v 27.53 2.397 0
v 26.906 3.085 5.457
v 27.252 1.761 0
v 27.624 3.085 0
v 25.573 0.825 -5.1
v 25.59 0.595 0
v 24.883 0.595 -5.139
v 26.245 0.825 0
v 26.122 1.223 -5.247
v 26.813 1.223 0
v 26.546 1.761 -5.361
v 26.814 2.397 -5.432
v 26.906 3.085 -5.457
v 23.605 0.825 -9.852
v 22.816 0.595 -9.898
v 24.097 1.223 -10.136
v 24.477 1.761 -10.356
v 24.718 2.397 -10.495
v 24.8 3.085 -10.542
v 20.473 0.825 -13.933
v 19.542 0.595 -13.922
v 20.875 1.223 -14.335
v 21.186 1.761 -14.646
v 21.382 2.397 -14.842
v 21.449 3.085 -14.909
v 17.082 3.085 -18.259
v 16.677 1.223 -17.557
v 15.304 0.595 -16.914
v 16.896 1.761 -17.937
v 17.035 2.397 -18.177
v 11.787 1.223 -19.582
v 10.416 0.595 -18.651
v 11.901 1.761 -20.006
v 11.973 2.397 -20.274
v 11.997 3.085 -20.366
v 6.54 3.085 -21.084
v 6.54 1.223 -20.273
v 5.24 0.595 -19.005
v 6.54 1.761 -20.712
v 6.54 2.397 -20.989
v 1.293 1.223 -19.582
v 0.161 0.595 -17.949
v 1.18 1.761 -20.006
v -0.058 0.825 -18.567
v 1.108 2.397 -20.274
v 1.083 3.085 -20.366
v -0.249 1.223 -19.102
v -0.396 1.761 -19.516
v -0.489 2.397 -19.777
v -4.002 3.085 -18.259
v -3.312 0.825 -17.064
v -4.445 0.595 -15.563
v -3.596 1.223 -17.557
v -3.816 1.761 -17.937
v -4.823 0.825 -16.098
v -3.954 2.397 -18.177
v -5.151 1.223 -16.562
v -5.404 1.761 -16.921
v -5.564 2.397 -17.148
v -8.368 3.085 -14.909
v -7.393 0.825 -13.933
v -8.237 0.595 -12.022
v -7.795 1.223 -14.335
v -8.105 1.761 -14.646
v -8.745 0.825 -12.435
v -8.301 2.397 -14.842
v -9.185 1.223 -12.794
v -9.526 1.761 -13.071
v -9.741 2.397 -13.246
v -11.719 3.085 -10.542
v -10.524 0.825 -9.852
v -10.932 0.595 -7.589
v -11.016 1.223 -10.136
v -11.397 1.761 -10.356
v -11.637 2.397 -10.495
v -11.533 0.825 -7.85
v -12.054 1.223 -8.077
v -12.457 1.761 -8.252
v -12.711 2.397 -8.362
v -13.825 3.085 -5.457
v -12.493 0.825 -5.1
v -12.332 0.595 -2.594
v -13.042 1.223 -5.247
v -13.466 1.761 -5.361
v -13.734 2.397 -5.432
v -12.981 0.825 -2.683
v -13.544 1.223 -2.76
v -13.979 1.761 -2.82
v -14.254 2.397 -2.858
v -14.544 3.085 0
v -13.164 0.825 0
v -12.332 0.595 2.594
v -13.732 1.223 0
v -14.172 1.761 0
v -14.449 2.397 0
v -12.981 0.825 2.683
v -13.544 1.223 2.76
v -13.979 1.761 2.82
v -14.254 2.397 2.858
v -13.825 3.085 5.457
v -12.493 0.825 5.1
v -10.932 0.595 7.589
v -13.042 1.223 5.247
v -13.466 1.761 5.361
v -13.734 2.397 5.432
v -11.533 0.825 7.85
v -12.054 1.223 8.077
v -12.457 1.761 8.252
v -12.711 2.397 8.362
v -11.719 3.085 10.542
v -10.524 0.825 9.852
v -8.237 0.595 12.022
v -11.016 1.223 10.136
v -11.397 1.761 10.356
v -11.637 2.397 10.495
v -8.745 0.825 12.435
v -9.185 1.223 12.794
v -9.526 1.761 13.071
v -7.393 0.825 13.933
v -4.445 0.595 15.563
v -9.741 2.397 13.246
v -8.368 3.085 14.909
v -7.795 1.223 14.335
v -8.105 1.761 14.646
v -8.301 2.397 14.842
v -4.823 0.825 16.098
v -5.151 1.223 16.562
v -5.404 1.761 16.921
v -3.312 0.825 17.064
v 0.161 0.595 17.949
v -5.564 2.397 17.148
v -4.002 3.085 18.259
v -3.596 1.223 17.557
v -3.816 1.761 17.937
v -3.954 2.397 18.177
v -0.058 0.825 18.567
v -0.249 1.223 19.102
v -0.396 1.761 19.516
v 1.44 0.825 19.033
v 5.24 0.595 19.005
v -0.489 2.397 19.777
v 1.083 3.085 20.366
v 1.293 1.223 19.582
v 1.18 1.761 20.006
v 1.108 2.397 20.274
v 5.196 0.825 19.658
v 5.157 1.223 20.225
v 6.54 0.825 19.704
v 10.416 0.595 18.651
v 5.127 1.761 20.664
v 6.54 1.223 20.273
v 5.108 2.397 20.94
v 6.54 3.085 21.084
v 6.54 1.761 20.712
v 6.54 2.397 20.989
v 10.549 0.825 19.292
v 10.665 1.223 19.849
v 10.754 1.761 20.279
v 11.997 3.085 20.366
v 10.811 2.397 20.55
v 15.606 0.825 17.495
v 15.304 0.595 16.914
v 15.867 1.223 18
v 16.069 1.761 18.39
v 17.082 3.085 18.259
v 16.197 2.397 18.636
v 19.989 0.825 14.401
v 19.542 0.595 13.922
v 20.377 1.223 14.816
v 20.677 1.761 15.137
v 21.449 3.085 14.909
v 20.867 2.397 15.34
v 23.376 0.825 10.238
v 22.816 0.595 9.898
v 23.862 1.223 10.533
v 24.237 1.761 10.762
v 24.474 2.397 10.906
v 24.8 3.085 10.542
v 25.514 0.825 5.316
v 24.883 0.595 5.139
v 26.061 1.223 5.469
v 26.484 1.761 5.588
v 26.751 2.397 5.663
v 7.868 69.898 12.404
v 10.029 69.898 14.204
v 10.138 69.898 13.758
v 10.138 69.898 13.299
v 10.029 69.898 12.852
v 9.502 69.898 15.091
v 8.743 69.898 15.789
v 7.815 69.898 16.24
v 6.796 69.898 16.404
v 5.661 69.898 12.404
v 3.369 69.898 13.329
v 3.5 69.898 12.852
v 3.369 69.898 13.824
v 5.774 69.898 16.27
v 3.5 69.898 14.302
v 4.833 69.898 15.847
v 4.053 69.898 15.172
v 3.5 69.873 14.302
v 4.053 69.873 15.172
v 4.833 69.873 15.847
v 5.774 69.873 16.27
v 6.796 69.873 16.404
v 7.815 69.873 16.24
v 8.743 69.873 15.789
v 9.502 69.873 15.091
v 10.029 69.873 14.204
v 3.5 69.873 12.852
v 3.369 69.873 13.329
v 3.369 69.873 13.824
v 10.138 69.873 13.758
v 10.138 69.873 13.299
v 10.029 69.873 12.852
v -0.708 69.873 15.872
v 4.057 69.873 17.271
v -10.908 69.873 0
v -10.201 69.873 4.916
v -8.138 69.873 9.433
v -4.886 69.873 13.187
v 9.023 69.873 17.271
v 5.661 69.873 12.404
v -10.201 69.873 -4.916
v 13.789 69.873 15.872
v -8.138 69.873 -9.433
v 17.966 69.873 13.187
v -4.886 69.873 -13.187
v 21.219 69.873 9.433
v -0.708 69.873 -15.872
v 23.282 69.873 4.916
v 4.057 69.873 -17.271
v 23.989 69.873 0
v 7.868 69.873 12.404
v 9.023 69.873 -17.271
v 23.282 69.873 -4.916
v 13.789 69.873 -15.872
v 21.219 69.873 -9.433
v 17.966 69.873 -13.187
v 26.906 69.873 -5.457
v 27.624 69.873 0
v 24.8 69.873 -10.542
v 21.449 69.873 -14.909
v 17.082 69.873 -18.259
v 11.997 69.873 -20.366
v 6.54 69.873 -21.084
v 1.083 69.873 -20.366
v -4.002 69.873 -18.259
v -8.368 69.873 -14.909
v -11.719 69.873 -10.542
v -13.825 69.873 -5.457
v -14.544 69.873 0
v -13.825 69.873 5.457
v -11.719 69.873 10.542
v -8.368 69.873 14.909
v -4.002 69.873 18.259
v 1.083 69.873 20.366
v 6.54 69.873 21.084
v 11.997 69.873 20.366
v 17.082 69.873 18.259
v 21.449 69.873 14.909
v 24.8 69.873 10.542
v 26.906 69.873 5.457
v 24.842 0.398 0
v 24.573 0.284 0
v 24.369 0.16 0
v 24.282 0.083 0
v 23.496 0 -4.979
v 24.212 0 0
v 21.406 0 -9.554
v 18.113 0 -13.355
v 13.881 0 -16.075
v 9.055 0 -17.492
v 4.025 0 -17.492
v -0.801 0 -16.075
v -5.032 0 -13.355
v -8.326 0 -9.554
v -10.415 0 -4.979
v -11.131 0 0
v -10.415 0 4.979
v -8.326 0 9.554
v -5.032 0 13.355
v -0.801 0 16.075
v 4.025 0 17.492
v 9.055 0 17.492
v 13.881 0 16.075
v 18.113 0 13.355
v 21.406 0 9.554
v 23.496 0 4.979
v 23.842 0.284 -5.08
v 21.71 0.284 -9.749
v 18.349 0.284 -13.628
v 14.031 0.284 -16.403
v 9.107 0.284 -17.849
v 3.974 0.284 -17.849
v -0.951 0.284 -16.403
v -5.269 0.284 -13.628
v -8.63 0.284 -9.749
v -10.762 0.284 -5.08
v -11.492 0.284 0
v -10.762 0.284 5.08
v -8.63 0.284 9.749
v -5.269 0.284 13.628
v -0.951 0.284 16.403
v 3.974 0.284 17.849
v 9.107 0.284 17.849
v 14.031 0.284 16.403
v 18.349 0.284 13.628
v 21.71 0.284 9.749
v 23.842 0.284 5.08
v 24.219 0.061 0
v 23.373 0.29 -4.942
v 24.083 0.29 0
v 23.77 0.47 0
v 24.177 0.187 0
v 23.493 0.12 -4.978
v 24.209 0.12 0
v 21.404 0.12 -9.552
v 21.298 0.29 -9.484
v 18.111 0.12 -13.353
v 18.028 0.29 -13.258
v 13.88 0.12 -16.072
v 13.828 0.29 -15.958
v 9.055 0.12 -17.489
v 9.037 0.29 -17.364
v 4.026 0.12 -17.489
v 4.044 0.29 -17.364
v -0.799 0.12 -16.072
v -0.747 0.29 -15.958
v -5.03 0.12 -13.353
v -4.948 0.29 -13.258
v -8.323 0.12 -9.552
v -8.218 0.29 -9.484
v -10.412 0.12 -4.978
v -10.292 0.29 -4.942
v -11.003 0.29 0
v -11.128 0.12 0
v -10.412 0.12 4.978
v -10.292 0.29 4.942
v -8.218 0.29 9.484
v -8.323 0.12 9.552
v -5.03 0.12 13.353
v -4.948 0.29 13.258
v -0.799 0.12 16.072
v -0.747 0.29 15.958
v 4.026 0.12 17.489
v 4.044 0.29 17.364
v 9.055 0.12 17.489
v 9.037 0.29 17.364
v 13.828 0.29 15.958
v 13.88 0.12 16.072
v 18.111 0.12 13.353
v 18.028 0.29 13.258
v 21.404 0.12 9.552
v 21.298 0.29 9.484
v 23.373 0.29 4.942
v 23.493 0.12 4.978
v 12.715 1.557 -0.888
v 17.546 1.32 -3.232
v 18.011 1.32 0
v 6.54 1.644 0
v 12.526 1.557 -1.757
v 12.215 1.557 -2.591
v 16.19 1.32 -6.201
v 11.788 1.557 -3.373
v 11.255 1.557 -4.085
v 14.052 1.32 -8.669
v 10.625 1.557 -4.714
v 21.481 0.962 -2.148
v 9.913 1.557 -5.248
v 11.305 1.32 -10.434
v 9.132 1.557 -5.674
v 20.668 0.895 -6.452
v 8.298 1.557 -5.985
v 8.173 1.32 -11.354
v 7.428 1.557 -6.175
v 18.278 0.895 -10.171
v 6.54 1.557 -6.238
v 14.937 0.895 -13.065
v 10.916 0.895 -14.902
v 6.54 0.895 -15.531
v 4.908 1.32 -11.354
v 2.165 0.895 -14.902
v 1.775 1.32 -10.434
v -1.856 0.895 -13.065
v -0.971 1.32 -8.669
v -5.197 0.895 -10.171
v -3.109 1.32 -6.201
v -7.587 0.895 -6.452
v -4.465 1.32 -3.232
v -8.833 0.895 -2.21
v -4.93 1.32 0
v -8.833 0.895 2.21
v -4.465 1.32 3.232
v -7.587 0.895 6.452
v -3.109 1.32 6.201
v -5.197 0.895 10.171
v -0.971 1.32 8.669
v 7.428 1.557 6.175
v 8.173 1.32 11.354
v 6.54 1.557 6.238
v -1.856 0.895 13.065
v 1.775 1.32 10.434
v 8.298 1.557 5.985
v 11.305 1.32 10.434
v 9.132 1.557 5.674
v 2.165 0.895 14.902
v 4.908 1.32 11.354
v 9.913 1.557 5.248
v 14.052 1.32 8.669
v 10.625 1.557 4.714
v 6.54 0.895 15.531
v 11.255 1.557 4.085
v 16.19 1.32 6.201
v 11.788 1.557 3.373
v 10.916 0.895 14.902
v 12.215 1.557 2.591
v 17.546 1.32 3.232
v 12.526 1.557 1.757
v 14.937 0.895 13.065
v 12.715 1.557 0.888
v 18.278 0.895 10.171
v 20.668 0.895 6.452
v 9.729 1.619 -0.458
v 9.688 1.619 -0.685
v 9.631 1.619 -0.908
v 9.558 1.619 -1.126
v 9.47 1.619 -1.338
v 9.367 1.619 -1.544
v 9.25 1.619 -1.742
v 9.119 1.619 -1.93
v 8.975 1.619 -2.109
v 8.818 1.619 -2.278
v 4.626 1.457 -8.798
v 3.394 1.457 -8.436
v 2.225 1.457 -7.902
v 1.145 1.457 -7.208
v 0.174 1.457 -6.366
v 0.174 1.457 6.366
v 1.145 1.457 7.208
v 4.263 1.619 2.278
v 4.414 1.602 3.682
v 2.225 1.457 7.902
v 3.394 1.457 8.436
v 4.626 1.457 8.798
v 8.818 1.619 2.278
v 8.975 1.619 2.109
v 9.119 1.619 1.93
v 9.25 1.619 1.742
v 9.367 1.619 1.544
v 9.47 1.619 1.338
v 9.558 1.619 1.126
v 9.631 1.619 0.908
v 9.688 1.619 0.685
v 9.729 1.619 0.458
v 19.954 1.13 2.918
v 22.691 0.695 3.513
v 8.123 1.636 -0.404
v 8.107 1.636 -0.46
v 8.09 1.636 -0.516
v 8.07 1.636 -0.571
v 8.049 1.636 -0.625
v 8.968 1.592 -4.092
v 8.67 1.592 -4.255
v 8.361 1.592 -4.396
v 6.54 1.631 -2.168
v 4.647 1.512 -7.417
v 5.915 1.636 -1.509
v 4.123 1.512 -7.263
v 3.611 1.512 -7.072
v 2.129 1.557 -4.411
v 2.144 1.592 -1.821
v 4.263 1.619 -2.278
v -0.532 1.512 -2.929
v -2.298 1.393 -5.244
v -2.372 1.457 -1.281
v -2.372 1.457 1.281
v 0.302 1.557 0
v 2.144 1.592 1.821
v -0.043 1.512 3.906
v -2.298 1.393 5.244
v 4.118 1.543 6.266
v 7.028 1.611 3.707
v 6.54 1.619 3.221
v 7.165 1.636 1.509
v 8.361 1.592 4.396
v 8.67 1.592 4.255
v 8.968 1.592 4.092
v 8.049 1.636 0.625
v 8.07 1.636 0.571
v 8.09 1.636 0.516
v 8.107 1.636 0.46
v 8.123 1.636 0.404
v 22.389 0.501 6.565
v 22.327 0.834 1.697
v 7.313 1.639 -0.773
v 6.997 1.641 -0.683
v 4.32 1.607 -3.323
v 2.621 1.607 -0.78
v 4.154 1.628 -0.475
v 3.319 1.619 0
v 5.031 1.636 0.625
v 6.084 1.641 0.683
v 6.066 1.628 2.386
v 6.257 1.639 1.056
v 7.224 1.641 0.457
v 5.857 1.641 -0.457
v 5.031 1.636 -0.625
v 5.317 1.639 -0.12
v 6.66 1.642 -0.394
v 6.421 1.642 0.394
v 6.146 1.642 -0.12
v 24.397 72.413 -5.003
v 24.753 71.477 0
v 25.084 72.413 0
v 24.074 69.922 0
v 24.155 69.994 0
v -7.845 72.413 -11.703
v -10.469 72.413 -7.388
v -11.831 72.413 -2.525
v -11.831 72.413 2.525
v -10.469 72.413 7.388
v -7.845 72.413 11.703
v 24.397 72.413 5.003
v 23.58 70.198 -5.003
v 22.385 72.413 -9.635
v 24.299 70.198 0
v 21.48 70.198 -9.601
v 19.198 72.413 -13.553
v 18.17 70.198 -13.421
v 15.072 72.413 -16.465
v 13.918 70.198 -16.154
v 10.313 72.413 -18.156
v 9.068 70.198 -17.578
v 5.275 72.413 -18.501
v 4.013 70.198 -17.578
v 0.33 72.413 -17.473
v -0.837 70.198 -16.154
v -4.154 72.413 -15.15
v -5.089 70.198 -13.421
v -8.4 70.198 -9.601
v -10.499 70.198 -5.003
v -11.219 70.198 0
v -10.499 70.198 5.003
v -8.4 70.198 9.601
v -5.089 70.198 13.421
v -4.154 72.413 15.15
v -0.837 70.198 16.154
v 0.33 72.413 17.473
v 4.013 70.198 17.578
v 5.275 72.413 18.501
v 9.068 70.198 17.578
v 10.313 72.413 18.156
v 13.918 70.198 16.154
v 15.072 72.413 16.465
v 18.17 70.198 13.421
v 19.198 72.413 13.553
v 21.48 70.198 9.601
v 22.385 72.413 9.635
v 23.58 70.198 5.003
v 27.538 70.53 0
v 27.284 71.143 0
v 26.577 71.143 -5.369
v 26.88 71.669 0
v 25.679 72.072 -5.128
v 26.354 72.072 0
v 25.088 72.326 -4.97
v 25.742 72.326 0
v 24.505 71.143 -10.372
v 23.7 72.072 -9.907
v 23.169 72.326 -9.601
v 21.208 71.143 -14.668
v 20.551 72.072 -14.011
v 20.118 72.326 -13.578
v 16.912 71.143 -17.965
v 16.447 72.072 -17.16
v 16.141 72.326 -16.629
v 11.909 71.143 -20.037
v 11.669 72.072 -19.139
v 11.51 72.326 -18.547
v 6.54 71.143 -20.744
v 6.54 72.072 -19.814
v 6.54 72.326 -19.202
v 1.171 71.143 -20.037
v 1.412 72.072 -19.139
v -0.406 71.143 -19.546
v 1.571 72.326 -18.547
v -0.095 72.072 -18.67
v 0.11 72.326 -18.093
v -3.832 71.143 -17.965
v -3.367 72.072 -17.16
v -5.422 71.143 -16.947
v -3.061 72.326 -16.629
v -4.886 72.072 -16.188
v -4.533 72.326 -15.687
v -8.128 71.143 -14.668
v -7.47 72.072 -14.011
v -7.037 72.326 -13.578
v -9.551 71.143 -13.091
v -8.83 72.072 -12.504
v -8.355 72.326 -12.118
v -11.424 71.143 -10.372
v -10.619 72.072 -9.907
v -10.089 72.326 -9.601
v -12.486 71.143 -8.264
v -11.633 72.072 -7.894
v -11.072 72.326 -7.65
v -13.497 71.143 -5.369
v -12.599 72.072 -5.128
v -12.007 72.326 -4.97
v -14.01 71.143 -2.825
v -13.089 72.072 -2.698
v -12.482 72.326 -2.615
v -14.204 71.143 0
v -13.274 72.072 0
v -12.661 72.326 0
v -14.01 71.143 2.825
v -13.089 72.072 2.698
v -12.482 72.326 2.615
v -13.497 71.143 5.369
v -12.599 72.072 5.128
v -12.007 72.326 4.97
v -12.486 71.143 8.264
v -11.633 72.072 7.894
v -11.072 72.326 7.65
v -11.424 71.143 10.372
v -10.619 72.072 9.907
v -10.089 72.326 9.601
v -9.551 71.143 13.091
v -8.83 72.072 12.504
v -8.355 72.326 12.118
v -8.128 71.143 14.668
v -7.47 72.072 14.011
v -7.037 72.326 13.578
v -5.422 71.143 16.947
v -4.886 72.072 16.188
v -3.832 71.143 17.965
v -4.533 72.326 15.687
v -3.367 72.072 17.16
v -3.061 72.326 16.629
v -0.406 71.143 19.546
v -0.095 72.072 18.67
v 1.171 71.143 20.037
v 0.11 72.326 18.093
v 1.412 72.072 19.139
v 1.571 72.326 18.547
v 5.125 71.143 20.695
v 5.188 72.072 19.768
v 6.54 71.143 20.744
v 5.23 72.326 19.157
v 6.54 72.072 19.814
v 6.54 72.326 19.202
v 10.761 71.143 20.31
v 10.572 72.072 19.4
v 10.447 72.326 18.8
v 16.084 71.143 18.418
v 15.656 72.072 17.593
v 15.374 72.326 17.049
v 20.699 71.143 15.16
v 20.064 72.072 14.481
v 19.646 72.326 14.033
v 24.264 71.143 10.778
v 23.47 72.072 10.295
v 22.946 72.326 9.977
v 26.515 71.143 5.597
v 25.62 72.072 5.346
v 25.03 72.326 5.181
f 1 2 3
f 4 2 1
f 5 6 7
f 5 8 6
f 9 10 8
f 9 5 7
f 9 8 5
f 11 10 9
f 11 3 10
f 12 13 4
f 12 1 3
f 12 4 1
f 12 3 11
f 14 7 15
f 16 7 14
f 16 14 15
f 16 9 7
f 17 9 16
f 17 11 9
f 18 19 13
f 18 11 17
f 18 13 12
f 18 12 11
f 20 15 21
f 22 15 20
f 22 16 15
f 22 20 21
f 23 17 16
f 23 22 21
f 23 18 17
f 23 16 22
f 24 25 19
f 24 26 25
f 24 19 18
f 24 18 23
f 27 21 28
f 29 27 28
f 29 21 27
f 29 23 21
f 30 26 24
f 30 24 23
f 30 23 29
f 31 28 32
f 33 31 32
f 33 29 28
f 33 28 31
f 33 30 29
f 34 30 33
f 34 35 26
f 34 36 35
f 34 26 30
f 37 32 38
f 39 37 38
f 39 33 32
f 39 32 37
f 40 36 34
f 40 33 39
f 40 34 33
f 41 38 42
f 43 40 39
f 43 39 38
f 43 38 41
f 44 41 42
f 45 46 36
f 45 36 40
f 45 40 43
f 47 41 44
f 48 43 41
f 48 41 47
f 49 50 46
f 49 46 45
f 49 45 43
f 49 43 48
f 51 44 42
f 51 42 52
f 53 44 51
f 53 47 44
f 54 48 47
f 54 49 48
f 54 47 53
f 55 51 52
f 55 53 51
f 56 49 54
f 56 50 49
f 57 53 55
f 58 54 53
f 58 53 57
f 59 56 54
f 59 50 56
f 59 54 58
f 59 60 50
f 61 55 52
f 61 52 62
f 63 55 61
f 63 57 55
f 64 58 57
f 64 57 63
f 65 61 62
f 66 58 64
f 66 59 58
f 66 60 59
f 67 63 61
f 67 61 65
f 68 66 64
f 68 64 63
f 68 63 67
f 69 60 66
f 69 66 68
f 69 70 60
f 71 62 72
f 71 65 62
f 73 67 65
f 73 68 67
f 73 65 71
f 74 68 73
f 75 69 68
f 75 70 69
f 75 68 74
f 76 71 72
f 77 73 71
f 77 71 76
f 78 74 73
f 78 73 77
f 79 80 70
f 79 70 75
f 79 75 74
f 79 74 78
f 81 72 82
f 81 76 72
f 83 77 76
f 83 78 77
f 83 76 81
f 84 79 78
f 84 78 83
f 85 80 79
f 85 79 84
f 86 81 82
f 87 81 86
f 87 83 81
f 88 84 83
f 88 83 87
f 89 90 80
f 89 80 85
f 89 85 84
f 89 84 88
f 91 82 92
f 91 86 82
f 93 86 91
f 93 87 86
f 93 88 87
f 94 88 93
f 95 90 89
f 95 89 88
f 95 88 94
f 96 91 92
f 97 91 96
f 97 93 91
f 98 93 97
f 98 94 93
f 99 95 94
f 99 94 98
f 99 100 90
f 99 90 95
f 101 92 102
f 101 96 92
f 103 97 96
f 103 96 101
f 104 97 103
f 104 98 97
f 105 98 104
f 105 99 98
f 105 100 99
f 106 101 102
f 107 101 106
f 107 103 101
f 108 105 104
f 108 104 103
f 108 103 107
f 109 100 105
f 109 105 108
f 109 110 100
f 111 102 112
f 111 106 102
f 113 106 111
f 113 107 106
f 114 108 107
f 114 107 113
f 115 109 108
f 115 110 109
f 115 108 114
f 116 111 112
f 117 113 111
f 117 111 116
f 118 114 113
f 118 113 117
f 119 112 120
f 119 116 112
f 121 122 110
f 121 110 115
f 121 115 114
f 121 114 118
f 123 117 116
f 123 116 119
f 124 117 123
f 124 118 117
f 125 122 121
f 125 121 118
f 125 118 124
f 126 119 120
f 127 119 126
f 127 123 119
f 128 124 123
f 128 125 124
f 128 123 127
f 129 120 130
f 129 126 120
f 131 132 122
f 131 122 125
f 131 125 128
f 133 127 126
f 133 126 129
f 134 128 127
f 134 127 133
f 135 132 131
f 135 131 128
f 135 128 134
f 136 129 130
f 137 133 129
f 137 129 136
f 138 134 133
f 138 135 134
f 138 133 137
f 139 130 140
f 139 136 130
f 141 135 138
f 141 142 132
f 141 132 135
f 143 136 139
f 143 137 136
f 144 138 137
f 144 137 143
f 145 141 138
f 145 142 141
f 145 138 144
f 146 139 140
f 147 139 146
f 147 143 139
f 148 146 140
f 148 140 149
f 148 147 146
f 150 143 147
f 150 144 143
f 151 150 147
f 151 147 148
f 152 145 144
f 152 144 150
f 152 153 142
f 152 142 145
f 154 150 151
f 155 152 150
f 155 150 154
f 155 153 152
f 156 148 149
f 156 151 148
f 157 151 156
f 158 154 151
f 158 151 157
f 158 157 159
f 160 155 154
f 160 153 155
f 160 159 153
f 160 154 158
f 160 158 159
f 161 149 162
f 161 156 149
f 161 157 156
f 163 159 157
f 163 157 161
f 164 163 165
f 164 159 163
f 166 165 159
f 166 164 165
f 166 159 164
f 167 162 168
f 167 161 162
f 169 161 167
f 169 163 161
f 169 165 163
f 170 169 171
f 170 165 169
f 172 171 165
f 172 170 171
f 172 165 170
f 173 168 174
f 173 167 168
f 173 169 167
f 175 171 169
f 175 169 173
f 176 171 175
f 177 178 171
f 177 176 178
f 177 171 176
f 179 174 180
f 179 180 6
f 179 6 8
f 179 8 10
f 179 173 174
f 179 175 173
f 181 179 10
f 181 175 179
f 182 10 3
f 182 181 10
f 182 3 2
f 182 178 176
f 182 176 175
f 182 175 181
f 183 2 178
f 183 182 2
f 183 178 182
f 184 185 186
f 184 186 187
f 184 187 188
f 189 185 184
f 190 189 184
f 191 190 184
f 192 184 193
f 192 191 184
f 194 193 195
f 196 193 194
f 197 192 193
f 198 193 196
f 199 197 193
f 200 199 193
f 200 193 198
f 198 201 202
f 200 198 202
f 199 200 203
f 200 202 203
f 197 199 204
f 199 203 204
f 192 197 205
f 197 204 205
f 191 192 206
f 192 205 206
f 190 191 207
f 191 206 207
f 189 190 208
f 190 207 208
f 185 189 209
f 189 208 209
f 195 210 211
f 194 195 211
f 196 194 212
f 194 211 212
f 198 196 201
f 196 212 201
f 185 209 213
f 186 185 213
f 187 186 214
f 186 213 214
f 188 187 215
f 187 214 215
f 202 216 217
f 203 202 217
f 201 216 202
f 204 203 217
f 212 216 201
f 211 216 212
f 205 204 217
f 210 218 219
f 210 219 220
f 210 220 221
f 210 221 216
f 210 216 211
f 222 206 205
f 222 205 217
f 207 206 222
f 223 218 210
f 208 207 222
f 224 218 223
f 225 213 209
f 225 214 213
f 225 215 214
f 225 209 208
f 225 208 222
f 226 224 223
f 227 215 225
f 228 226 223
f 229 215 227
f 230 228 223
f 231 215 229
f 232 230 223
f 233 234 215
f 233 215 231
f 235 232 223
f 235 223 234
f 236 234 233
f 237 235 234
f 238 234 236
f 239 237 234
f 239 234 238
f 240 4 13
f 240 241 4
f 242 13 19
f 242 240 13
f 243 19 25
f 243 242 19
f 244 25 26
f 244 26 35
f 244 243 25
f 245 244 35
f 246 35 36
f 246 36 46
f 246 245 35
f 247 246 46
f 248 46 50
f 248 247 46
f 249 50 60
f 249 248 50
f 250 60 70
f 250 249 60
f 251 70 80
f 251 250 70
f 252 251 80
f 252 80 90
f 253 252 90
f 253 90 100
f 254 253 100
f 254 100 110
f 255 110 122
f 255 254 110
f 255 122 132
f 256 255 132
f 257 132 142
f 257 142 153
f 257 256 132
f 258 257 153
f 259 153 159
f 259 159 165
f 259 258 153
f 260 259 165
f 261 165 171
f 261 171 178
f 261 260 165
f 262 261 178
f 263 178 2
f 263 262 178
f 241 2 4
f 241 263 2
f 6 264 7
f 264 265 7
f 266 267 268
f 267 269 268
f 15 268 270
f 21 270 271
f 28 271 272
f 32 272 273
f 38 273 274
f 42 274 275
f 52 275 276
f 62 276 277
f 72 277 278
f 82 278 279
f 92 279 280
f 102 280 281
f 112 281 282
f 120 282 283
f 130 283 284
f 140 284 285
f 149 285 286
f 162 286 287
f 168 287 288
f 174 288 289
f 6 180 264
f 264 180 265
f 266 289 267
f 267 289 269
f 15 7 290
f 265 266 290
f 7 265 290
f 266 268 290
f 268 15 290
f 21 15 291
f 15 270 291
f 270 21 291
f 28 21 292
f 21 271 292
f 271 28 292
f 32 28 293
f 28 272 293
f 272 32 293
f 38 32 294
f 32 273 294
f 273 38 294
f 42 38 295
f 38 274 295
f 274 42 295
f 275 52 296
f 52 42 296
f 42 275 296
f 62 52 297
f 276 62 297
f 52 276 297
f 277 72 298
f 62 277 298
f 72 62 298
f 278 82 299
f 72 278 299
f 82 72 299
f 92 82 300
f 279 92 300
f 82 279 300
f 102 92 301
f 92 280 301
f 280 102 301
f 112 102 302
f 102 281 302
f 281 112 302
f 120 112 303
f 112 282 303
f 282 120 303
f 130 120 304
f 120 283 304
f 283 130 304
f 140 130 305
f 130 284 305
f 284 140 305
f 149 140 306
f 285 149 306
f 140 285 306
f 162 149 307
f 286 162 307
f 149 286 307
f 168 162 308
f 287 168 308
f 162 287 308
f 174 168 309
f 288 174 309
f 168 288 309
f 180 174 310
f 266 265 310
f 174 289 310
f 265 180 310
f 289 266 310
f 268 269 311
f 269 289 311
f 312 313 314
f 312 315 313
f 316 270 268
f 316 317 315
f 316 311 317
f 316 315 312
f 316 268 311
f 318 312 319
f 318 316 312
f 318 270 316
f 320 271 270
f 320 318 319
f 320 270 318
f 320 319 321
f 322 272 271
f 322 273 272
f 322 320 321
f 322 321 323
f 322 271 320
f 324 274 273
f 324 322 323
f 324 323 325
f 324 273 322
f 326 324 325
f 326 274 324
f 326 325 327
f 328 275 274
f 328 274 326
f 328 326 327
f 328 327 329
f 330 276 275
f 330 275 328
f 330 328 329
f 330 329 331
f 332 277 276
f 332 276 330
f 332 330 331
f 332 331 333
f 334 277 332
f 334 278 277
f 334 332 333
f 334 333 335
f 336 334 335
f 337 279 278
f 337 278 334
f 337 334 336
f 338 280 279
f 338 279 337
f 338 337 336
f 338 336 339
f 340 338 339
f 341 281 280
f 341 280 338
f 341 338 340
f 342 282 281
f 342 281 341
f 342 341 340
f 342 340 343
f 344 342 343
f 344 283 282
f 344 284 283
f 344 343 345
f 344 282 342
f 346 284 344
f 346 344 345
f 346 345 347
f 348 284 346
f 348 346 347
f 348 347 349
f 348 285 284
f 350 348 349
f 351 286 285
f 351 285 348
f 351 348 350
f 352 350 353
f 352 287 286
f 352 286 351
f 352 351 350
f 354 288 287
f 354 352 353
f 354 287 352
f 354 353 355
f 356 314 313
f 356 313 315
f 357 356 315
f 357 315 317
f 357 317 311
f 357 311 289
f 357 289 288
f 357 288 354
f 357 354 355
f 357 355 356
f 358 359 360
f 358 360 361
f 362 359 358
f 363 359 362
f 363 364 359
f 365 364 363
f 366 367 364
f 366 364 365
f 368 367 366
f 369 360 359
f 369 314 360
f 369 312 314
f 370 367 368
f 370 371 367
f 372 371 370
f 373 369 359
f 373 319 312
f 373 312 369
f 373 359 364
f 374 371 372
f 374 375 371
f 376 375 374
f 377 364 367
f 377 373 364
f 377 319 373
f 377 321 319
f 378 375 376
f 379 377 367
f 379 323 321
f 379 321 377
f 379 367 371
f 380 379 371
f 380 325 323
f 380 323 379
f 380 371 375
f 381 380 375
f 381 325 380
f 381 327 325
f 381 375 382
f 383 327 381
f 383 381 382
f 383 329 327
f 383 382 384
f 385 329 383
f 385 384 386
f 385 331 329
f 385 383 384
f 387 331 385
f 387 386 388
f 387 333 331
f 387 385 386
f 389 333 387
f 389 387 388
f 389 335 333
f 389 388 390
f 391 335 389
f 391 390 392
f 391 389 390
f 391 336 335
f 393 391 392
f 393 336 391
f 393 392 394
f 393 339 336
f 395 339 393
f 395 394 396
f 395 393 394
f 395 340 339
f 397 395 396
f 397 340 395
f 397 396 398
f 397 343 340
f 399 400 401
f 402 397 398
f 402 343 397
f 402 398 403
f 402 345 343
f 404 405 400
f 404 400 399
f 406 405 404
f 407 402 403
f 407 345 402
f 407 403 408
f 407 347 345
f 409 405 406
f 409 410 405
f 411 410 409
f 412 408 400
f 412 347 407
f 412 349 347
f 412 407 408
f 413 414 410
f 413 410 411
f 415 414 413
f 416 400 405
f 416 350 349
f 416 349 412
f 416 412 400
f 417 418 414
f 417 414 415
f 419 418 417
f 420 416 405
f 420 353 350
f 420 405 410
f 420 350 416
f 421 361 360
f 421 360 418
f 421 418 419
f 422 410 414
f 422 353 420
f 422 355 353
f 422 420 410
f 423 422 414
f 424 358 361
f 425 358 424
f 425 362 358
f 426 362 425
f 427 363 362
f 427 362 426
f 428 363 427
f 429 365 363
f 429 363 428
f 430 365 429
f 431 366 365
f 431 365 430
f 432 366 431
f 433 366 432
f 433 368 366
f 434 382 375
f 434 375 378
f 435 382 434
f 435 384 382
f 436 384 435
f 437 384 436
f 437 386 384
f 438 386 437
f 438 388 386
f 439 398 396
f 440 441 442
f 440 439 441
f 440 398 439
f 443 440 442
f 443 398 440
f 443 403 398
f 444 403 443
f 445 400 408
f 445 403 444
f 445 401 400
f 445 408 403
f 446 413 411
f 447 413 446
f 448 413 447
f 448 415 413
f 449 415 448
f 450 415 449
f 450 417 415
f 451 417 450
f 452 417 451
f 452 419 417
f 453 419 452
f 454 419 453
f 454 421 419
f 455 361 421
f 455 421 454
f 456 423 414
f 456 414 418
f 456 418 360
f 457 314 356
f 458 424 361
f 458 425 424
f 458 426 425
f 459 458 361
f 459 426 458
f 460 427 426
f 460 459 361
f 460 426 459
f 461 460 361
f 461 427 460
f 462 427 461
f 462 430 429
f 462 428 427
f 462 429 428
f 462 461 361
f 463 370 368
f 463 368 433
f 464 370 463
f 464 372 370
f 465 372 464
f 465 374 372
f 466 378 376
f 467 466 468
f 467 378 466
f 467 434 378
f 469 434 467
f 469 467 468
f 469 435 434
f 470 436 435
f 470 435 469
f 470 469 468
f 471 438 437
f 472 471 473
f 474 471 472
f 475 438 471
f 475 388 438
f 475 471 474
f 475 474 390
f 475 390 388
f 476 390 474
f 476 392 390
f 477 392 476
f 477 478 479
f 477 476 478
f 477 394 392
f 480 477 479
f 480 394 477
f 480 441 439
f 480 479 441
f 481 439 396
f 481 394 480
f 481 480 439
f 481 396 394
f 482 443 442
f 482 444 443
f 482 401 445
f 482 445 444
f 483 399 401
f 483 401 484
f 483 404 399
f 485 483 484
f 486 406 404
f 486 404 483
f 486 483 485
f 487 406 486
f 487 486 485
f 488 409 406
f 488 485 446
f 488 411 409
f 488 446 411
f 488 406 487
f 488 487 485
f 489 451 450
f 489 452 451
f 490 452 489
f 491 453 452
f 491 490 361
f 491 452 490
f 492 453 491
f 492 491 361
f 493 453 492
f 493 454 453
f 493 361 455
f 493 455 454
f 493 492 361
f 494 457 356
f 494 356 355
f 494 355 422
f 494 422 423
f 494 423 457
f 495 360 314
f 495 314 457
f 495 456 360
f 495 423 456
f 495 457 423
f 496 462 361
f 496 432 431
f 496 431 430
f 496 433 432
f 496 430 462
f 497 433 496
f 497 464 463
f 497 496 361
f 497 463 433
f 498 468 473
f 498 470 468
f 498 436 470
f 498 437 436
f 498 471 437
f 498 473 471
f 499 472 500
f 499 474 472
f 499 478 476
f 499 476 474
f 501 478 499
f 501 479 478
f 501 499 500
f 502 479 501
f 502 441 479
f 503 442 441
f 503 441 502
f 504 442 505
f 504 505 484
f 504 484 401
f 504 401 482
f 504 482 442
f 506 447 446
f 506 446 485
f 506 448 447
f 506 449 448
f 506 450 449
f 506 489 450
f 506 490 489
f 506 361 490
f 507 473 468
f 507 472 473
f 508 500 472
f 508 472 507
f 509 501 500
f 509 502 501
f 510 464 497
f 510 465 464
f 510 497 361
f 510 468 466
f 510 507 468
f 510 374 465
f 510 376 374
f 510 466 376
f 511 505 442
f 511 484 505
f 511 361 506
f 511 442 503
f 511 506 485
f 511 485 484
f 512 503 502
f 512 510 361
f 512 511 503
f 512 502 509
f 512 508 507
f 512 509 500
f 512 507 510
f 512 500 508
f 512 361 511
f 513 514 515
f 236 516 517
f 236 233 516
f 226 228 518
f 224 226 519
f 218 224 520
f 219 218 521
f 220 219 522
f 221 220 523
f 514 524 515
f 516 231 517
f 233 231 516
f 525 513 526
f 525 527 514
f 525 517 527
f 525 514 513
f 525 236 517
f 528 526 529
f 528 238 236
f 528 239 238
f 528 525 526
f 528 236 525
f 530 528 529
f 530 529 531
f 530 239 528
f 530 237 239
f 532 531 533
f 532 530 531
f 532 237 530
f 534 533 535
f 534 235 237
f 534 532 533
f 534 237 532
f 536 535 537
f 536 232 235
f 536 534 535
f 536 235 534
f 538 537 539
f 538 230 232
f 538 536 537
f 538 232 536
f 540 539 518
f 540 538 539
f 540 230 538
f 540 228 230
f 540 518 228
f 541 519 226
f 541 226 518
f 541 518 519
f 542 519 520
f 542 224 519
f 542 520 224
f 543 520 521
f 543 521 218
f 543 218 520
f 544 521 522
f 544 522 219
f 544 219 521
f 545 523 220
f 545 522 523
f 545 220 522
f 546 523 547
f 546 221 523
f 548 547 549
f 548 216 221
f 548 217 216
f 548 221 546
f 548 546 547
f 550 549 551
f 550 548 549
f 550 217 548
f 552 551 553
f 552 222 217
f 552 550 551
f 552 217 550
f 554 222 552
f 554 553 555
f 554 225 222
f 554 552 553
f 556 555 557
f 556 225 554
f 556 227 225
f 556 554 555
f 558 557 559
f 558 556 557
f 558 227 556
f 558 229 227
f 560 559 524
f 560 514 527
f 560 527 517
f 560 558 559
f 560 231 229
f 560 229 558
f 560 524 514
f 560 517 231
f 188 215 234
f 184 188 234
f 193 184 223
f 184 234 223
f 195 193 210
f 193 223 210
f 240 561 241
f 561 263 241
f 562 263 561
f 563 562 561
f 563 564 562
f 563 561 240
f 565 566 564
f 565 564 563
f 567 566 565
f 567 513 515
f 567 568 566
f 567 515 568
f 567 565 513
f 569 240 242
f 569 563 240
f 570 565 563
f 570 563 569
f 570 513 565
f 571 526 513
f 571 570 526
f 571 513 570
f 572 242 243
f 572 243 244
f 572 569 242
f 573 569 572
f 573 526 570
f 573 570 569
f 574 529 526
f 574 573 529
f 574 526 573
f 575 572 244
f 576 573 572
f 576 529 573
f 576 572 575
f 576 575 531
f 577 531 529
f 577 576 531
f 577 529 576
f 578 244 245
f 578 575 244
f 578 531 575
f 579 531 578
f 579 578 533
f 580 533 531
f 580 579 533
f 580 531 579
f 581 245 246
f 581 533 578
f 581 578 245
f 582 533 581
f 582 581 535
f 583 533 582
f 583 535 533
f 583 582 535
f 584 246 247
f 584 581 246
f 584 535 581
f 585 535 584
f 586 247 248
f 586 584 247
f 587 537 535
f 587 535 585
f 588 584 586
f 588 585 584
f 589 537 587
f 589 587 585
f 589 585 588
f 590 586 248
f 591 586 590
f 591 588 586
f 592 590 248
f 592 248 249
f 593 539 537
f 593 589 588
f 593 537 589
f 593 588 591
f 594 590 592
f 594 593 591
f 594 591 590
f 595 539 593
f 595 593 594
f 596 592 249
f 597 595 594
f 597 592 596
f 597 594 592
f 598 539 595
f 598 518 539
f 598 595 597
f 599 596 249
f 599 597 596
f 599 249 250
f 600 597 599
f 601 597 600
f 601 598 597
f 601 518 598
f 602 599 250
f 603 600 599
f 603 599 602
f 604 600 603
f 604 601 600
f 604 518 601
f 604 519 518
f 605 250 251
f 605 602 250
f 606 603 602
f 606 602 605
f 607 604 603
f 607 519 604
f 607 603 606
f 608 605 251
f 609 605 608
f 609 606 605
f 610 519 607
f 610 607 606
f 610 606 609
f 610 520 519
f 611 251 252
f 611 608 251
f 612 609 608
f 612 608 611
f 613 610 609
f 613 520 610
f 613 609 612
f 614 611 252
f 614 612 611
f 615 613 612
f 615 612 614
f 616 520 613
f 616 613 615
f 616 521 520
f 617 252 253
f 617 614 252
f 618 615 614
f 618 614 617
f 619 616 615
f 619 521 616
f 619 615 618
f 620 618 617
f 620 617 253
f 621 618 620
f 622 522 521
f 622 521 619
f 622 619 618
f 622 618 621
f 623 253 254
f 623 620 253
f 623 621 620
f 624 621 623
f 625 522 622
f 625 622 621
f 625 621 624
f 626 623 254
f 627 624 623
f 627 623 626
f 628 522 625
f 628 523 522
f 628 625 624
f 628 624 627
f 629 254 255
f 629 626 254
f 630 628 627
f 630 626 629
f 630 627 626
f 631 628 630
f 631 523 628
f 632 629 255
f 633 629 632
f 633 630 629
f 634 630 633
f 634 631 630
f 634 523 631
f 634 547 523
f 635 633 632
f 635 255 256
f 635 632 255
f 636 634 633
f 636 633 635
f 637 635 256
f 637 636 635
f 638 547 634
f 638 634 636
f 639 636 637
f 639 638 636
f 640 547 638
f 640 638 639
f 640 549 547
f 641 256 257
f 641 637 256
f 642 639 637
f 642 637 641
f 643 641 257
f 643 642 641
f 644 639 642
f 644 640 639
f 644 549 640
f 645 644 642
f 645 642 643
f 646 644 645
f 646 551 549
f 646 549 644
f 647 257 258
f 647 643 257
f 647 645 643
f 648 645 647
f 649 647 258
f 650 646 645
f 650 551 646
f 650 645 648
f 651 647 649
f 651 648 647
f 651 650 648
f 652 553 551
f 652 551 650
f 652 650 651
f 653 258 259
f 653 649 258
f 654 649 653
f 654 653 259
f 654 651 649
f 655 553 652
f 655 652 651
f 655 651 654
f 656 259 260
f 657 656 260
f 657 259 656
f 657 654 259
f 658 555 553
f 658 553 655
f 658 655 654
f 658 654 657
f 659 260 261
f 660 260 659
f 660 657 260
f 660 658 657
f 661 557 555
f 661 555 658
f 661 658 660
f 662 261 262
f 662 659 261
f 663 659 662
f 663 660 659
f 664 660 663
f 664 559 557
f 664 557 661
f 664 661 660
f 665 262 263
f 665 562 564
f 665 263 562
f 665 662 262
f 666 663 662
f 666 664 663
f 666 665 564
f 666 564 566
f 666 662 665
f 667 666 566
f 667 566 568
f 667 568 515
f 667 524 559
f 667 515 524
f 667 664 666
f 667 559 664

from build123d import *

# Parameters (mm, degrees)
F3_DEPTH = 0.0254


with BuildPart() as f1:
    # F0 (on Top) → F1 (revolve)
    with BuildSketch(Plane.XY):
        with BuildLine():
            Line((6.5402514301, 69.8725463986), (6.5402514301, 1.6435814323))
            add(Edge.make_bspline(
                [(6.5402514301, 1.6435814323), (16.6055685907, 1.6237888089), (24.4864700581, 1.0951121643), (24.2117271912, 0)],
                knots=[0, 0, 0, 0, 0.7582969465, 0.7582969465, 0.7582969465, 0.7582969465], degree=3))
            add(Edge.make_bspline(
                [(25.5896002368, 0.5953258758), (24.9631976139, 0.4681905354), (24.4171222, 0.2947845137), (24.2117271912, 0)],
                knots=[0.3083695275, 0.3083695275, 0.3083695275, 0.3083695275, 0.5848021934, 0.5848021934, 0.5848021934, 0.5848021934], degree=3))
            ThreePointArc((25.5896002368, 0.5953258758), (27.050958138, 1.47703779), (27.624379952, 3.0845732447))
            Line((27.624379952, 3.0845732447), (27.624379952, 69.8725463986))
            ThreePointArc((27.624379952, 69.8725463986), (26.8804311762, 71.6685976229), (25.084379952, 72.4125463986))
            add(Edge.make_bspline(
                [(25.084379952, 72.4125463986), (24.711275029, 71.678932761), (24.5228062968, 70.0934224878), (23.9885225892, 69.8725463986)],
                knots=[0, 0, 0, 0, 0.3680062222, 0.3680062222, 0.3680062222, 0.3680062222], degree=3))
            add(Edge.make_bspline(
                [(23.9885225892, 69.8725463986), (23.8915327068, 69.8324501995), (23.783146815, 69.837324245), (23.6659098082, 69.8725463986)],
                knots=[0.3680062222, 0.3680062222, 0.3680062222, 0.3680062222, 0.4348113291, 0.4348113291, 0.4348113291, 0.4348113291], degree=3))
            Line((23.6659098082, 69.8725463986), (6.5402514301, 69.8725463986))
        make_face()
        with BuildLine():
            Line((23.9885225892, 69.8725463986), (23.6659098082, 69.8725463986))
            add(Edge.make_bspline(
                [(23.9885225892, 69.8725463986), (23.8915327068, 69.8324501995), (23.783146815, 69.837324245), (23.6659098082, 69.8725463986)],
                knots=[0.3680062222, 0.3680062222, 0.3680062222, 0.3680062222, 0.4348113291, 0.4348113291, 0.4348113291, 0.4348113291], degree=3))
        make_face()
    revolve(axis=Axis((6.5402514301, 35.7580639155, 0), (0, 1, 0)))

    # F2 (on face) → F3 (join)
    with BuildSketch(Plane(origin=(0, 69.8725463986, 0), x_dir=(-1, 0, 0), z_dir=(0, 1, 0))):
        with BuildLine():
            ThreePointArc((-3.4999095369, 12.8522840624), (-3.3524060249, 13.5768925878), (-3.4999095369, 14.3015011132))
            ThreePointArc((-3.4999095369, 14.3015011132), (-6.7963991448, 16.4044588849), (-10.0287375972, 14.2041718005))
            ThreePointArc((-10.0287375972, 14.2041718005), (-10.1516131859, 13.5282279315), (-10.0287375972, 12.8522840624))
            ThreePointArc((-10.0287375972, 12.8522840624), (-6.764323567, 12.3472555866), (-3.4999095369, 12.8522840624))
        make_face()
    extrude(amount=F3_DEPTH)


solid = f1.part
